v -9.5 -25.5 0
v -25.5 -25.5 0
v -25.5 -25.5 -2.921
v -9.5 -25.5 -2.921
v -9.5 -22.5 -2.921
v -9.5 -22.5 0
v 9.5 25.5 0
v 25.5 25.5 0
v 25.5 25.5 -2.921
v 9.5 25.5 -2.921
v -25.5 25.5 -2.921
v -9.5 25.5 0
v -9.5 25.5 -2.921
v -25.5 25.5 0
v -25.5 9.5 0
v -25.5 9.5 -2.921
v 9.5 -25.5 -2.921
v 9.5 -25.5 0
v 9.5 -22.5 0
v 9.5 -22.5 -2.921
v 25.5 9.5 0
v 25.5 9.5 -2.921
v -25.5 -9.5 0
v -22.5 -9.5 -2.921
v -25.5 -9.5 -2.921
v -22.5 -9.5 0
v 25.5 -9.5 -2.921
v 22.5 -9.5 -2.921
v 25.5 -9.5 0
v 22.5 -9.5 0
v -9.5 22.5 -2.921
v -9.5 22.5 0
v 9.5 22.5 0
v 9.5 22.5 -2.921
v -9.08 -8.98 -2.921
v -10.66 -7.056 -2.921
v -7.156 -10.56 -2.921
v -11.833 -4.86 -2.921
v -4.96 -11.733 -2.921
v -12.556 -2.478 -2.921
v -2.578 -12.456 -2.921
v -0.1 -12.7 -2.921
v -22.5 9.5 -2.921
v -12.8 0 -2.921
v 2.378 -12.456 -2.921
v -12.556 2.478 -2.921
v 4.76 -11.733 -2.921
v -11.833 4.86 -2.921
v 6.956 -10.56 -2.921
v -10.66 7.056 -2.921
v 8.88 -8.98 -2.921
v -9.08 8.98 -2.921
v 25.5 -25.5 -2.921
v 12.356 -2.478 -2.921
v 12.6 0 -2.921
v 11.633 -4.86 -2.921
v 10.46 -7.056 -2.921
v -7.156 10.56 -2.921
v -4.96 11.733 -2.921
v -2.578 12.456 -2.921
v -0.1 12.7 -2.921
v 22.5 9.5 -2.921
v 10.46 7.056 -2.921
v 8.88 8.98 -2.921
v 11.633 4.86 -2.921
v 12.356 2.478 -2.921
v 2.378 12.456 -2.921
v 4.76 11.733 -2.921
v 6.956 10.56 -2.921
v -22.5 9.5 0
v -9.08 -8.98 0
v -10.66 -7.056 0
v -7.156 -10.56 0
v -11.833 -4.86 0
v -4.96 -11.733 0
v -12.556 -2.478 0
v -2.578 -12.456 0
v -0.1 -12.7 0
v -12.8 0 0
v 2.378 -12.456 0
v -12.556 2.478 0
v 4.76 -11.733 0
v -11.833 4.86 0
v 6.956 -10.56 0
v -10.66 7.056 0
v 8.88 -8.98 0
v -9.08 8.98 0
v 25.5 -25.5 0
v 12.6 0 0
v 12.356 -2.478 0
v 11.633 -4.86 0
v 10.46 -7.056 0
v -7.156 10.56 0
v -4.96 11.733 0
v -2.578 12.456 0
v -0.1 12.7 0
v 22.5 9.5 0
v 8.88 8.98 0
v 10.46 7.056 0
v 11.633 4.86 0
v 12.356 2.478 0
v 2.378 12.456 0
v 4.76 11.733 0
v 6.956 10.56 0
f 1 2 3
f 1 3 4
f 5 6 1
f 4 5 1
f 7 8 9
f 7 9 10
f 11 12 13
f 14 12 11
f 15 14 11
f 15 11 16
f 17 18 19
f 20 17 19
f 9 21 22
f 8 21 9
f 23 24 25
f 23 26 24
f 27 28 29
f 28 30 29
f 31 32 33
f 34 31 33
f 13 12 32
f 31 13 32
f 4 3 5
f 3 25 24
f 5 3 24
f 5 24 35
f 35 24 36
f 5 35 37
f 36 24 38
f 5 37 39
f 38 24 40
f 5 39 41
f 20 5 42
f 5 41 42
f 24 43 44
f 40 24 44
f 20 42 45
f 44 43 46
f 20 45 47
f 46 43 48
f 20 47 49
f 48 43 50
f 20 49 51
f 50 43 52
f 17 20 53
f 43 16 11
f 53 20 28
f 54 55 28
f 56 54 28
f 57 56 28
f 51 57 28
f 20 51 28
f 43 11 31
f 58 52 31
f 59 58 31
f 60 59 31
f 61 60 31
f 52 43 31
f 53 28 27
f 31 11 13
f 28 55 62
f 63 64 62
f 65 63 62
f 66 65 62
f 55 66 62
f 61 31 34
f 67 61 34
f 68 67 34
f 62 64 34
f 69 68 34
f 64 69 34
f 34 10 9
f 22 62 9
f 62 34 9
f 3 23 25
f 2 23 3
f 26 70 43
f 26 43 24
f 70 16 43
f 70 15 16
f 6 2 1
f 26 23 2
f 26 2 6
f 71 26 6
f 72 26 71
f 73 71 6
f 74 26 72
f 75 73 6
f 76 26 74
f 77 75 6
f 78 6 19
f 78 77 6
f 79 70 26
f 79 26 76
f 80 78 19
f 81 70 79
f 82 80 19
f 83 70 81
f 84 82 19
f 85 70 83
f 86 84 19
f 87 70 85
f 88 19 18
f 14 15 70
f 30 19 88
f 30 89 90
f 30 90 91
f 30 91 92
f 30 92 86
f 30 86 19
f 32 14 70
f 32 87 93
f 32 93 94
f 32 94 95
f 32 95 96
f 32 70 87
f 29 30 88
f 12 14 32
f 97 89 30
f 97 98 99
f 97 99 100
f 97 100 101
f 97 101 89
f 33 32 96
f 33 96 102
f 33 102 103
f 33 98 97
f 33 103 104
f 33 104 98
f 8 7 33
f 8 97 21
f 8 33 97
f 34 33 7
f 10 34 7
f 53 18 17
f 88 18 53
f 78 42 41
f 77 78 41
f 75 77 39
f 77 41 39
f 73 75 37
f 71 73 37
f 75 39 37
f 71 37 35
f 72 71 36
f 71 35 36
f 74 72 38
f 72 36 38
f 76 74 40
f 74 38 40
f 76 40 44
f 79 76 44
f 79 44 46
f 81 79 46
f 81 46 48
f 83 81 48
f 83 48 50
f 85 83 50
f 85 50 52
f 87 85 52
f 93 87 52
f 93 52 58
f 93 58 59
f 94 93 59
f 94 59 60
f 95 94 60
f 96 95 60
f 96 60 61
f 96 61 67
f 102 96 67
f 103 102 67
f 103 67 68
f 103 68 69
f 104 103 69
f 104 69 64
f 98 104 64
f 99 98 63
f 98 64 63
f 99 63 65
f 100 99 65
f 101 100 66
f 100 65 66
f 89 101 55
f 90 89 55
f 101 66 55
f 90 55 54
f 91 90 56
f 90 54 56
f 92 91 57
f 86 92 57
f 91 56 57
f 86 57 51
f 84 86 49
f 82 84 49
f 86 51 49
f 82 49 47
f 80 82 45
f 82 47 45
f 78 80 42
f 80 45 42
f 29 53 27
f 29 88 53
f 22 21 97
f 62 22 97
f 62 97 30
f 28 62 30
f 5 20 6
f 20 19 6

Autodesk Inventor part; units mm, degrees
ref_plane "YZ Plane" through (0, 0, 0) normal (1, 0, 0) x (0, 1, 0)
ref_plane "XZ Plane" through (0, 0, 0) normal (0, 1, 0) x (-1, 0, 0)
ref_plane "XY Plane" through (0, 0, 0) normal (0, 0, 1) x (1, 0, 0)
sketch "Sketch1" plane through (0, 0, 0) normal (0, 0, 1) x (1, 0, 0)
  line L0 (-25.5, -25.5) -> (25.5, -25.5)
  line L1 (25.5, -25.5) -> (25.5, 25.5)
  line L2 (25.5, 25.5) -> (-25.5, 25.5)
  line L3 (-25.5, 25.5) -> (-25.5, -25.5)
  line L4 (-25.5, -25.5) -> (25.5, 25.5) construction
  line L5 (25.5, -25.5) -> (-25.5, 25.5) construction
  point P0 (0, 0)
  dimension "d0" = 51
  dimension "d1" = 51
extrude "Extrusion1" add sketch "Sketch1" against normal blind 2.921
sketch "Sketch2" plane through (0, 0, 0) normal (0, 0, 1) x (1, 0, 0)
  line L0 (-13.0551, 25.5) -> (-9.5, 25.5)
  line L1 (-9.5, 25.5) -> (-9.5, 22.5)
  line L2 (-9.5, 22.5) -> (9.5, 22.5)
  line L3 (9.5, 22.5) -> (9.5, 25.5)
  line L4 (-9.5, 25.5) -> (9.5, 25.5)
  line L5 (-9.5, -25.5) -> (9.5, -25.5)
  line L6 (9.5, -25.5) -> (9.5, -22.5)
  line L7 (9.5, -22.5) -> (-9.5, -22.5)
  line L8 (-9.5, -22.5) -> (-9.5, -25.5)
  line L9 (-25.5, 9.5) -> (-22.5, 9.5)
  line L10 (-22.5, 9.5) -> (-22.5, -9.5)
  line L11 (-22.5, -9.5) -> (-25.5, -9.5)
  line L12 (-25.5, -9.5) -> (-25.5, 9.5)
  line L13 (25.5, 9.5) -> (22.5, 9.5)
  line L14 (22.5, 9.5) -> (22.5, -9.5)
  line L15 (22.5, -9.5) -> (25.5, -9.5)
  line L16 (25.5, -9.5) -> (25.5, 9.5)
  line L17 (25.5, -25.5) -> (25.5, 25.5) projected
  line L18 (-25.5, 25.5) -> (-25.5, -25.5) projected
  line L19 (-25.5, -25.5) -> (25.5, -25.5) projected
  line L20 (25.5, 25.5) -> (-25.5, 25.5) projected
  line L21 (-25.5, 25.5) -> (-25.5, -25.5) projected
  dimension "d4" = 3
  dimension "d5" = 19
  dimension "d17" = 19
  dimension "d18" = 3
  dimension "d19" = 3
  dimension "d20" = 19
  dimension "d34" = 3
  dimension "d35" = 19
  dimension "d47" = 16
  dimension "d48" = 16
  dimension "d49" = 16
  dimension "d50" = 16
  dimension "d51" = 16
  dimension "d52" = 45
extrude "Extrusion3" cut sketch "Sketch2" against normal blind 25.4 contours L4 L3 L2 L1 | L9 L10 L11 L12 | L16 L15 L14 L13 | L8 L7 L6 L5
hole "Hole1" at (-0.1, 0, 0) direction (0, 0, -1) diameter 25.4 end through all
equation "\"d1\" = d0"
equation "\"d17\" = d5"
equation "\"d18\" = d4"
equation "\"d19\" = d4"
equation "\"d20\" = d5"
equation "\"d34\" = d4"
equation "\"d35\" = d5"
equation "\"d47\" = -0.5 * d5 + 0.5 * d0"
equation "\"d49\" = d47"
equation "\"d50\" = d47"
equation "\"d51\" = d47"
equation "\"d53\" = 0.5 * d0"
properties part number "Side A"
